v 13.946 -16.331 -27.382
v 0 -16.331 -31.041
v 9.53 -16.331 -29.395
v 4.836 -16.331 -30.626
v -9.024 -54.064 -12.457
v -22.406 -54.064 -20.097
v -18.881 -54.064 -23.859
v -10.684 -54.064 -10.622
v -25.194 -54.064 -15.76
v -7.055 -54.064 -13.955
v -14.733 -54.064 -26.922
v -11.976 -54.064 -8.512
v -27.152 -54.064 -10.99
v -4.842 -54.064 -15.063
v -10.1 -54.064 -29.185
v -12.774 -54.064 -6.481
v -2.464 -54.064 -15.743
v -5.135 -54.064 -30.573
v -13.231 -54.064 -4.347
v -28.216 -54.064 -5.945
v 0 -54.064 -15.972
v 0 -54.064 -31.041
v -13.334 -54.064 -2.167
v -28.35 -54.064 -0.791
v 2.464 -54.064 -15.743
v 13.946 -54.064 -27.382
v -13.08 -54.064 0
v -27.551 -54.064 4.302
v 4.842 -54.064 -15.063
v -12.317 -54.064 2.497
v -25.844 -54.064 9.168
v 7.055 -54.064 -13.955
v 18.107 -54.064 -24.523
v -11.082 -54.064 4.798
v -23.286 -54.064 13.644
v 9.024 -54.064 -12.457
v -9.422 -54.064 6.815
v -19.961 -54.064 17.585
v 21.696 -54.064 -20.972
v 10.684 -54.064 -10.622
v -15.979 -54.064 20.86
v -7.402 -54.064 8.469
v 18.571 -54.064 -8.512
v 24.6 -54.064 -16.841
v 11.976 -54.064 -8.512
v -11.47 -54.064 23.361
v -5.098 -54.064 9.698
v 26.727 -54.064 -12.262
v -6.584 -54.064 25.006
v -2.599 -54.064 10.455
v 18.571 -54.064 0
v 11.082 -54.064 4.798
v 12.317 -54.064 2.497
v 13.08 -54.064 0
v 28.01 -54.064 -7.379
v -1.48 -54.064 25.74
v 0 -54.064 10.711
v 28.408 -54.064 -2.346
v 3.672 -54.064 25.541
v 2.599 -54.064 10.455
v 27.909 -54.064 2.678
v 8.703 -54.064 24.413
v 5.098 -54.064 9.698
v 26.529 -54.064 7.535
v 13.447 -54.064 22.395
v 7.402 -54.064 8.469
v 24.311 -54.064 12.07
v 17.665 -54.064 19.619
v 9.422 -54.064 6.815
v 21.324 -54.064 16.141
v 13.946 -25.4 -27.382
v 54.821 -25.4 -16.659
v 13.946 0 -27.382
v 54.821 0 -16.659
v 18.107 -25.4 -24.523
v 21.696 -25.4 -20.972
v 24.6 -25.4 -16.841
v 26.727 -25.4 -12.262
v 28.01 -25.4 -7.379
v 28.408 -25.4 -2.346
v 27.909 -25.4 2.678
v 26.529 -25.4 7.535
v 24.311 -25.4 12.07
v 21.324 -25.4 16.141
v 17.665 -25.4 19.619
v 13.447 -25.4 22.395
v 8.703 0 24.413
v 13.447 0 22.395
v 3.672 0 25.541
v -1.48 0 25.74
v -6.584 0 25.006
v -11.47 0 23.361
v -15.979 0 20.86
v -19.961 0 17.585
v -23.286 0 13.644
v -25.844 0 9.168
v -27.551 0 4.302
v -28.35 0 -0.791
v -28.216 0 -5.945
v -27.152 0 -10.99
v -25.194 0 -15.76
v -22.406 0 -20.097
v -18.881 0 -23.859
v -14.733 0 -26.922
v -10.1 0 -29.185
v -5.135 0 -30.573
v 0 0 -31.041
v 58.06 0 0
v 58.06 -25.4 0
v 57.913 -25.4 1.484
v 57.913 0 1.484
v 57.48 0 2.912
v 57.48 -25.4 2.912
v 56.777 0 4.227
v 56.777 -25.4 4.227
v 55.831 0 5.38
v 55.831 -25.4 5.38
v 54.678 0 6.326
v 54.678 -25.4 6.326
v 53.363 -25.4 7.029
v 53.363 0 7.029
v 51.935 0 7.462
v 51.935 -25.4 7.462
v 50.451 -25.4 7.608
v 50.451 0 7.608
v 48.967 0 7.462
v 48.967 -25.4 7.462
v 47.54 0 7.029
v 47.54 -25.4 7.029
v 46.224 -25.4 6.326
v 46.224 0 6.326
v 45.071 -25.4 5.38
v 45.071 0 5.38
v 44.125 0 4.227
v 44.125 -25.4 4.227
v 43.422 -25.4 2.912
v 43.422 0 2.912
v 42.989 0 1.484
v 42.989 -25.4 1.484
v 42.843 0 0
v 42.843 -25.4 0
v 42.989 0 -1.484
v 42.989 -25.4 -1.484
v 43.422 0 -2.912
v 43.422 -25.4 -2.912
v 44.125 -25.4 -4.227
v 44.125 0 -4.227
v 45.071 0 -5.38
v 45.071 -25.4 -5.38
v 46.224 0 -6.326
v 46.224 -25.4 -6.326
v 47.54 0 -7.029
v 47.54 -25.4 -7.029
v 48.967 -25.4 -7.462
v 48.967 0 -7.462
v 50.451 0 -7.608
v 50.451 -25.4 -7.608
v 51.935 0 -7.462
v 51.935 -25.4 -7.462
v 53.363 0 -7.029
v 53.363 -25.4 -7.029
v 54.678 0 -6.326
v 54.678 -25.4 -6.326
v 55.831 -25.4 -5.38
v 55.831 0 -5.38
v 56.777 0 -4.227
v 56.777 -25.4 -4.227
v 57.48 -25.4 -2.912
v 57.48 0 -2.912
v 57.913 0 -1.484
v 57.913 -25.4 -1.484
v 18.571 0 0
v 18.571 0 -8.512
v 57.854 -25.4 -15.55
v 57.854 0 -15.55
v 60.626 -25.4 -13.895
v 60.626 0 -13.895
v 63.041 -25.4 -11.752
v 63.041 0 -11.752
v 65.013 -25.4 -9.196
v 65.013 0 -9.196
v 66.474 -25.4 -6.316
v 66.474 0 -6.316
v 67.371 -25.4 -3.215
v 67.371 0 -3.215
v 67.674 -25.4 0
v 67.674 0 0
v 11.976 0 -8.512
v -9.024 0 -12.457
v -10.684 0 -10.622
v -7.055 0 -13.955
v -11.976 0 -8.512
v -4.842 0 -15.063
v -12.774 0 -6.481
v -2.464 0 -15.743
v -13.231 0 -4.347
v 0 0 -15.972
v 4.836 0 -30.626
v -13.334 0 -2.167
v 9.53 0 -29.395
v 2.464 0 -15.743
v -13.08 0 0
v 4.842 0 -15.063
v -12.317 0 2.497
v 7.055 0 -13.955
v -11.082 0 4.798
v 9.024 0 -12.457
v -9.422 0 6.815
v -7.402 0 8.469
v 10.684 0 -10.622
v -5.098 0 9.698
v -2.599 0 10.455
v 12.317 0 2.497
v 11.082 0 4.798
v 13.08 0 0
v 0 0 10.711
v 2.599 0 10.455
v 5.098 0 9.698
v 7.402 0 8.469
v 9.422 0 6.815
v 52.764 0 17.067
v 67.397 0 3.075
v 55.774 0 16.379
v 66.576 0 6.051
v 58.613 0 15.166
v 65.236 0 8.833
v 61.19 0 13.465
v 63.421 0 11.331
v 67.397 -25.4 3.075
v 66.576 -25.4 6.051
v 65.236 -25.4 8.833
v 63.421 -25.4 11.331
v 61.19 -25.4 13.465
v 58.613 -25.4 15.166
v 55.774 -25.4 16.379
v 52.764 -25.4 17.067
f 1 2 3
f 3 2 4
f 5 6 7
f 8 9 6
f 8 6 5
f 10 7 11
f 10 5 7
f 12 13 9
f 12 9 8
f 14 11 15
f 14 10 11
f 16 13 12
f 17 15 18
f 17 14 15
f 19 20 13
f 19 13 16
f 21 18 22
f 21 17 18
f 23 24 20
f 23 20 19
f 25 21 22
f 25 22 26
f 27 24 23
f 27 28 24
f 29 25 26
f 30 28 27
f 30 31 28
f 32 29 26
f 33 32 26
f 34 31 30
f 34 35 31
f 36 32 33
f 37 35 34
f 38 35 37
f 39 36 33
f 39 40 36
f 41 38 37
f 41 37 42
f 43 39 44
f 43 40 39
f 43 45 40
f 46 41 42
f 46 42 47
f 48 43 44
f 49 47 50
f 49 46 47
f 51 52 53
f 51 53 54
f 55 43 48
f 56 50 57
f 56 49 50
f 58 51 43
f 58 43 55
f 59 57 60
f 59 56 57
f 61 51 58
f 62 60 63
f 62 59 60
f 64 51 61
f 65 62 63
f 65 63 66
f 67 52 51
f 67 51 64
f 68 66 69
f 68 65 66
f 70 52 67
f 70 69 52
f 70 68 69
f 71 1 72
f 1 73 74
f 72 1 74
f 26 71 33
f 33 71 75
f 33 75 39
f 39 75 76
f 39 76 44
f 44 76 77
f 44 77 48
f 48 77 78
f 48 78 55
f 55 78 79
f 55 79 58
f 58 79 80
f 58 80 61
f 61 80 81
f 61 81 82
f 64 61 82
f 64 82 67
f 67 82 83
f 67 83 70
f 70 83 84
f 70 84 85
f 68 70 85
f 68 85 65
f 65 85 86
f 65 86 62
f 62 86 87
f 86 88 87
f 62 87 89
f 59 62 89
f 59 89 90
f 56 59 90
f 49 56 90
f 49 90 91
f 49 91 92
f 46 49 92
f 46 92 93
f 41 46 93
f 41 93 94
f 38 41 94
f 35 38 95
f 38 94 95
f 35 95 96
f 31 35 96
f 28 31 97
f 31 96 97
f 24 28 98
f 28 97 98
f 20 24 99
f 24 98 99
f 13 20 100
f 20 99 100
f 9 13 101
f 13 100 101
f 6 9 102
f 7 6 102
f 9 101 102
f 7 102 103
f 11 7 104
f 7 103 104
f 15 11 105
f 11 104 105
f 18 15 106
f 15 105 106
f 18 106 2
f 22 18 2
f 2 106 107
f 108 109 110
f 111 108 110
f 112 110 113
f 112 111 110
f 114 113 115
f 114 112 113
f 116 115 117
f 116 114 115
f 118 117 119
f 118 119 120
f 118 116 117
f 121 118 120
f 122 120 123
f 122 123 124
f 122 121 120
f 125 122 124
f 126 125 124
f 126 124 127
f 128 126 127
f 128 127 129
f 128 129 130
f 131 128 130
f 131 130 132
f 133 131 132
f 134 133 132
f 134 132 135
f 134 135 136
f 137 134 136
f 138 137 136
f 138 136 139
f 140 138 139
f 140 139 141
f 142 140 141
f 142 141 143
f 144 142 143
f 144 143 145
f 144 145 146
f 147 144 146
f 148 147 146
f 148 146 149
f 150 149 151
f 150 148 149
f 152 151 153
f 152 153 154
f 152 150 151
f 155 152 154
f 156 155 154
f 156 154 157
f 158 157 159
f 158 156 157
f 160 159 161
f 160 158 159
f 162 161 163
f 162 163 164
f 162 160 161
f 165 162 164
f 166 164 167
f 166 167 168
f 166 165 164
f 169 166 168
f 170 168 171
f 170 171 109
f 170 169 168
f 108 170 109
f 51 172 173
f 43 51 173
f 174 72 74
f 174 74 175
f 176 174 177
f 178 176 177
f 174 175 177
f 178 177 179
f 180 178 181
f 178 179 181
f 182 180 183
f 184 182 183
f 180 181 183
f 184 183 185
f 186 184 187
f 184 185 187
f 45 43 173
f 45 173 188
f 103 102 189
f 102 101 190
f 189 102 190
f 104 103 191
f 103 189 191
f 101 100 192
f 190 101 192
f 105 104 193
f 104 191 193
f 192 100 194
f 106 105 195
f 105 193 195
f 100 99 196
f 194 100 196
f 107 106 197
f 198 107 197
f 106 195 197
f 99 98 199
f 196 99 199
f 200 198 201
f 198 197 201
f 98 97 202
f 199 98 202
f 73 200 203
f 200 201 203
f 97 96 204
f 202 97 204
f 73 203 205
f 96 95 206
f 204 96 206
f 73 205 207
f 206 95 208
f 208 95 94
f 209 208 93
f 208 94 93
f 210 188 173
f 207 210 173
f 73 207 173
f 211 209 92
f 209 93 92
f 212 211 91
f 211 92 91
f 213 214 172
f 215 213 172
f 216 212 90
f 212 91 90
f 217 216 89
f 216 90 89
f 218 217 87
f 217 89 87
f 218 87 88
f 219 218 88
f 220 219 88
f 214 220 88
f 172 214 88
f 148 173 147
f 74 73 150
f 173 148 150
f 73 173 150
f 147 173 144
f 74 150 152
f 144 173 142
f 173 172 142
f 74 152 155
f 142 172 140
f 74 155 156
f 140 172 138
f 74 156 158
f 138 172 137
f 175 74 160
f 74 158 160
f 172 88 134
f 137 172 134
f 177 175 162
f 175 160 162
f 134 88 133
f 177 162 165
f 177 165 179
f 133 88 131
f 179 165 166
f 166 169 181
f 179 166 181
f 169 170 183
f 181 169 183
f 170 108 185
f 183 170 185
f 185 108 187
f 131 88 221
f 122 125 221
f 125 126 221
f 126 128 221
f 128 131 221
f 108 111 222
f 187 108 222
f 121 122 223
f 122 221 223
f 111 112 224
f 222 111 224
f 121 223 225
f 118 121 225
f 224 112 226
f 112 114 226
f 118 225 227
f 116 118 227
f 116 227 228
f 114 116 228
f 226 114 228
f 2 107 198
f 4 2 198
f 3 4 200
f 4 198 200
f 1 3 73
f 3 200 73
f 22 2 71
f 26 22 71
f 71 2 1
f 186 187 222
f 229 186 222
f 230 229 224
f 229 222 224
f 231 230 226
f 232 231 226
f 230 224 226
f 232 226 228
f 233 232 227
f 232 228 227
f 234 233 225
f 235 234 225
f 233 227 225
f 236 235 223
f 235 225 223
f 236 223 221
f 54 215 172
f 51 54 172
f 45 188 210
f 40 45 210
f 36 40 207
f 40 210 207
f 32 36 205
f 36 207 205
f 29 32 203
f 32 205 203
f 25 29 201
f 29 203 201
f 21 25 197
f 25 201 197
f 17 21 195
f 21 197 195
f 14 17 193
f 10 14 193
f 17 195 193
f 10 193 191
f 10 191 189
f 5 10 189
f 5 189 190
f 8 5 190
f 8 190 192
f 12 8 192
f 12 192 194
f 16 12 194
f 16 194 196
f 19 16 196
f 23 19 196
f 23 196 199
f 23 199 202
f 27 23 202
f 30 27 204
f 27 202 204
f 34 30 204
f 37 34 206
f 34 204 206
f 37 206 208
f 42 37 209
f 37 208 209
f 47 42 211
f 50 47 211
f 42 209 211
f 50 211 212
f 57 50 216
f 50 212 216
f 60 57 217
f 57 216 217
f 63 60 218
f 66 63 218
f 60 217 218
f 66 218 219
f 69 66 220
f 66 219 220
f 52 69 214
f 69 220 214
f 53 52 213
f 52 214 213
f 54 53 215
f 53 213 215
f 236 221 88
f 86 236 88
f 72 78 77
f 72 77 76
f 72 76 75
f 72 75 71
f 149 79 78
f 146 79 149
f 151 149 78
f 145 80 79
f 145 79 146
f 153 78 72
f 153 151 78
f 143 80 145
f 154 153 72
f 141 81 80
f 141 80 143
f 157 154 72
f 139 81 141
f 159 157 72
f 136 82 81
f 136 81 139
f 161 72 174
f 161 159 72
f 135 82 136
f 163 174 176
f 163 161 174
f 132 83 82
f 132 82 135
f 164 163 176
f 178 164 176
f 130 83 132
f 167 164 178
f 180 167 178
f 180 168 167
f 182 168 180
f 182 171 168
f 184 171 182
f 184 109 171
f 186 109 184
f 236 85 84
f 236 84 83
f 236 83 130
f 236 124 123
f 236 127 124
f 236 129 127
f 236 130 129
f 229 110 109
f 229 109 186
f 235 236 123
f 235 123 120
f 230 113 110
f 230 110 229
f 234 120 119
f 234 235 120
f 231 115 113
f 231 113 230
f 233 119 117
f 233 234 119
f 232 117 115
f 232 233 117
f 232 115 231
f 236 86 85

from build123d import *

# Parameters (mm, degrees)
F0_R     = 7.6083781551
F1_DEPTH = 25.4
F2_DEPTH = 16.33147
F3_DEPTH = 54.06381


with BuildPart() as f1:
    # F0 (on Front) → F1 (new body)
    with BuildSketch(Plane.XZ):
        with BuildLine():
            ThreePointArc((13.9462792399, -27.3820497182), (24.5288614061, -16.9645417548), (28.40983312, -2.6308898814))
            ThreePointArc((28.40983312, -2.6308898814), (24.3839357983, 11.9479404177), (13.4472466105, 22.394900346))
            ThreePointArc((13.4472466105, 22.394900346), (-27.5508361213, 4.3023667074), (0, -31.0407230014))
            Line((0, -31.0407230014), (13.9462792399, -27.3820497182))
        make_face()
        with BuildLine():
            ThreePointArc((-13.0795865189, 0), (0, 10.7106679389), (13.0795865189, 0))
            Line((13.0795865189, 0), (18.5709875077, 0))
            Line((18.5709875077, 0), (18.5709875077, -8.5117025301))
            Line((18.5709875077, -8.5117025301), (11.9755253606, -8.5117025301))
            ThreePointArc((11.9755253606, -8.5117025301), (0, -15.9724477017), (-11.9755253606, -8.5117025301))
            Line((-11.9755253606, -8.5117025301), (-17.9519541562, -8.5117025301))
            Line((-17.9519541562, -8.5117025301), (-17.9519541562, 0))
            Line((-17.9519541562, 0), (-13.0795865189, 0))
        make_face(mode=Mode.SUBTRACT)
        with BuildLine():
            ThreePointArc((13.4472466105, 22.394900346), (24.3839357983, 11.9479404177), (28.40983312, -2.6308898814))
            ThreePointArc((28.40983312, -2.6308898814), (24.5288614061, -16.9645417548), (13.9462792399, -27.3820497182))
            Line((13.9462792399, -27.3820497182), (54.8214644814, -16.6588349012))
            ThreePointArc((54.8214644814, -16.6588349012), (33.2605864945, -1.0486865195), (52.764098421, 17.0665340036))
            Line((52.764098421, 17.0665340036), (13.4472466105, 22.394900346))
        make_face()
        with BuildLine():
            ThreePointArc((67.6737267911, 0), (63.4213470707, 11.3309708435), (52.764098421, 17.0665340036))
            ThreePointArc((52.764098421, 17.0665340036), (33.2605864945, -1.0486865195), (54.8214644814, -16.6588349012))
            ThreePointArc((54.8214644814, -16.6588349012), (64.0872268937, -10.5201880537), (67.6737267911, 0))
        make_face()
        with Locations((50.4511781037, 0)):
            Circle(F0_R, mode=Mode.SUBTRACT)
        with BuildLine():
            ThreePointArc((-11.9755253606, -8.5117025301), (-13.2307190966, -4.3470592374), (-13.0795865189, 0))
            Line((-13.0795865189, 0), (-17.9519541562, 0))
            Line((-17.9519541562, 0), (-17.9519541562, -8.5117025301))
            Line((-17.9519541562, -8.5117025301), (-11.9755253606, -8.5117025301))
        make_face()
    extrude(amount=F1_DEPTH)

    # F0 (on Front) → F2 (join)
    with BuildSketch(Plane.XZ):
        with BuildLine():
            ThreePointArc((13.9462792399, -27.3820497182), (24.5288614061, -16.9645417548), (28.40983312, -2.6308898814))
            ThreePointArc((28.40983312, -2.6308898814), (24.3839357983, 11.9479404177), (13.4472466105, 22.394900346))
            ThreePointArc((13.4472466105, 22.394900346), (-27.5508361213, 4.3023667074), (0, -31.0407230014))
            Line((0, -31.0407230014), (13.9462792399, -27.3820497182))
        make_face()
        with BuildLine():
            ThreePointArc((-13.0795865189, 0), (0, 10.7106679389), (13.0795865189, 0))
            Line((13.0795865189, 0), (18.5709875077, 0))
            Line((18.5709875077, 0), (18.5709875077, -8.5117025301))
            Line((18.5709875077, -8.5117025301), (11.9755253606, -8.5117025301))
            ThreePointArc((11.9755253606, -8.5117025301), (0, -15.9724477017), (-11.9755253606, -8.5117025301))
            Line((-11.9755253606, -8.5117025301), (-17.9519541562, -8.5117025301))
            Line((-17.9519541562, -8.5117025301), (-17.9519541562, 0))
            Line((-17.9519541562, 0), (-13.0795865189, 0))
        make_face(mode=Mode.SUBTRACT)
        with BuildLine():
            ThreePointArc((13.4472466105, 22.394900346), (24.3839357983, 11.9479404177), (28.40983312, -2.6308898814))
            ThreePointArc((28.40983312, -2.6308898814), (24.5288614061, -16.9645417548), (13.9462792399, -27.3820497182))
            Line((13.9462792399, -27.3820497182), (54.8214644814, -16.6588349012))
            ThreePointArc((54.8214644814, -16.6588349012), (33.2605864945, -1.0486865195), (52.764098421, 17.0665340036))
            Line((52.764098421, 17.0665340036), (13.4472466105, 22.394900346))
        make_face()
        with BuildLine():
            ThreePointArc((0, -31.0407230014), (7.2091017962, -30.1108365553), (13.9462792399, -27.3820497182))
            Line((13.9462792399, -27.3820497182), (0, -31.0407230014))
        make_face()
        with BuildLine():
            ThreePointArc((67.6737267911, 0), (63.4213470707, 11.3309708435), (52.764098421, 17.0665340036))
            ThreePointArc((52.764098421, 17.0665340036), (33.2605864945, -1.0486865195), (54.8214644814, -16.6588349012))
            ThreePointArc((54.8214644814, -16.6588349012), (64.0872268937, -10.5201880537), (67.6737267911, 0))
        make_face()
        with Locations((50.4511781037, 0)):
            Circle(F0_R, mode=Mode.SUBTRACT)
    extrude(amount=F2_DEPTH)

    # F0 (on Front) → F3 (join)
    with BuildSketch(Plane.XZ):
        with BuildLine():
            ThreePointArc((13.9462792399, -27.3820497182), (24.5288614061, -16.9645417548), (28.40983312, -2.6308898814))
            ThreePointArc((28.40983312, -2.6308898814), (24.3839357983, 11.9479404177), (13.4472466105, 22.394900346))
            ThreePointArc((13.4472466105, 22.394900346), (-27.5508361213, 4.3023667074), (0, -31.0407230014))
            Line((0, -31.0407230014), (13.9462792399, -27.3820497182))
        make_face()
        with BuildLine():
            ThreePointArc((-13.0795865189, 0), (0, 10.7106679389), (13.0795865189, 0))
            Line((13.0795865189, 0), (18.5709875077, 0))
            Line((18.5709875077, 0), (18.5709875077, -8.5117025301))
            Line((18.5709875077, -8.5117025301), (11.9755253606, -8.5117025301))
            ThreePointArc((11.9755253606, -8.5117025301), (0, -15.9724477017), (-11.9755253606, -8.5117025301))
            Line((-11.9755253606, -8.5117025301), (-17.9519541562, -8.5117025301))
            Line((-17.9519541562, -8.5117025301), (-17.9519541562, 0))
            Line((-17.9519541562, 0), (-13.0795865189, 0))
        make_face(mode=Mode.SUBTRACT)
        with BuildLine():
            ThreePointArc((-11.9755253606, -8.5117025301), (-13.2307190966, -4.3470592374), (-13.0795865189, 0))
            Line((-13.0795865189, 0), (-17.9519541562, 0))
            Line((-17.9519541562, 0), (-17.9519541562, -8.5117025301))
            Line((-17.9519541562, -8.5117025301), (-11.9755253606, -8.5117025301))
        make_face()
    extrude(amount=F3_DEPTH)


solid = f1.part
